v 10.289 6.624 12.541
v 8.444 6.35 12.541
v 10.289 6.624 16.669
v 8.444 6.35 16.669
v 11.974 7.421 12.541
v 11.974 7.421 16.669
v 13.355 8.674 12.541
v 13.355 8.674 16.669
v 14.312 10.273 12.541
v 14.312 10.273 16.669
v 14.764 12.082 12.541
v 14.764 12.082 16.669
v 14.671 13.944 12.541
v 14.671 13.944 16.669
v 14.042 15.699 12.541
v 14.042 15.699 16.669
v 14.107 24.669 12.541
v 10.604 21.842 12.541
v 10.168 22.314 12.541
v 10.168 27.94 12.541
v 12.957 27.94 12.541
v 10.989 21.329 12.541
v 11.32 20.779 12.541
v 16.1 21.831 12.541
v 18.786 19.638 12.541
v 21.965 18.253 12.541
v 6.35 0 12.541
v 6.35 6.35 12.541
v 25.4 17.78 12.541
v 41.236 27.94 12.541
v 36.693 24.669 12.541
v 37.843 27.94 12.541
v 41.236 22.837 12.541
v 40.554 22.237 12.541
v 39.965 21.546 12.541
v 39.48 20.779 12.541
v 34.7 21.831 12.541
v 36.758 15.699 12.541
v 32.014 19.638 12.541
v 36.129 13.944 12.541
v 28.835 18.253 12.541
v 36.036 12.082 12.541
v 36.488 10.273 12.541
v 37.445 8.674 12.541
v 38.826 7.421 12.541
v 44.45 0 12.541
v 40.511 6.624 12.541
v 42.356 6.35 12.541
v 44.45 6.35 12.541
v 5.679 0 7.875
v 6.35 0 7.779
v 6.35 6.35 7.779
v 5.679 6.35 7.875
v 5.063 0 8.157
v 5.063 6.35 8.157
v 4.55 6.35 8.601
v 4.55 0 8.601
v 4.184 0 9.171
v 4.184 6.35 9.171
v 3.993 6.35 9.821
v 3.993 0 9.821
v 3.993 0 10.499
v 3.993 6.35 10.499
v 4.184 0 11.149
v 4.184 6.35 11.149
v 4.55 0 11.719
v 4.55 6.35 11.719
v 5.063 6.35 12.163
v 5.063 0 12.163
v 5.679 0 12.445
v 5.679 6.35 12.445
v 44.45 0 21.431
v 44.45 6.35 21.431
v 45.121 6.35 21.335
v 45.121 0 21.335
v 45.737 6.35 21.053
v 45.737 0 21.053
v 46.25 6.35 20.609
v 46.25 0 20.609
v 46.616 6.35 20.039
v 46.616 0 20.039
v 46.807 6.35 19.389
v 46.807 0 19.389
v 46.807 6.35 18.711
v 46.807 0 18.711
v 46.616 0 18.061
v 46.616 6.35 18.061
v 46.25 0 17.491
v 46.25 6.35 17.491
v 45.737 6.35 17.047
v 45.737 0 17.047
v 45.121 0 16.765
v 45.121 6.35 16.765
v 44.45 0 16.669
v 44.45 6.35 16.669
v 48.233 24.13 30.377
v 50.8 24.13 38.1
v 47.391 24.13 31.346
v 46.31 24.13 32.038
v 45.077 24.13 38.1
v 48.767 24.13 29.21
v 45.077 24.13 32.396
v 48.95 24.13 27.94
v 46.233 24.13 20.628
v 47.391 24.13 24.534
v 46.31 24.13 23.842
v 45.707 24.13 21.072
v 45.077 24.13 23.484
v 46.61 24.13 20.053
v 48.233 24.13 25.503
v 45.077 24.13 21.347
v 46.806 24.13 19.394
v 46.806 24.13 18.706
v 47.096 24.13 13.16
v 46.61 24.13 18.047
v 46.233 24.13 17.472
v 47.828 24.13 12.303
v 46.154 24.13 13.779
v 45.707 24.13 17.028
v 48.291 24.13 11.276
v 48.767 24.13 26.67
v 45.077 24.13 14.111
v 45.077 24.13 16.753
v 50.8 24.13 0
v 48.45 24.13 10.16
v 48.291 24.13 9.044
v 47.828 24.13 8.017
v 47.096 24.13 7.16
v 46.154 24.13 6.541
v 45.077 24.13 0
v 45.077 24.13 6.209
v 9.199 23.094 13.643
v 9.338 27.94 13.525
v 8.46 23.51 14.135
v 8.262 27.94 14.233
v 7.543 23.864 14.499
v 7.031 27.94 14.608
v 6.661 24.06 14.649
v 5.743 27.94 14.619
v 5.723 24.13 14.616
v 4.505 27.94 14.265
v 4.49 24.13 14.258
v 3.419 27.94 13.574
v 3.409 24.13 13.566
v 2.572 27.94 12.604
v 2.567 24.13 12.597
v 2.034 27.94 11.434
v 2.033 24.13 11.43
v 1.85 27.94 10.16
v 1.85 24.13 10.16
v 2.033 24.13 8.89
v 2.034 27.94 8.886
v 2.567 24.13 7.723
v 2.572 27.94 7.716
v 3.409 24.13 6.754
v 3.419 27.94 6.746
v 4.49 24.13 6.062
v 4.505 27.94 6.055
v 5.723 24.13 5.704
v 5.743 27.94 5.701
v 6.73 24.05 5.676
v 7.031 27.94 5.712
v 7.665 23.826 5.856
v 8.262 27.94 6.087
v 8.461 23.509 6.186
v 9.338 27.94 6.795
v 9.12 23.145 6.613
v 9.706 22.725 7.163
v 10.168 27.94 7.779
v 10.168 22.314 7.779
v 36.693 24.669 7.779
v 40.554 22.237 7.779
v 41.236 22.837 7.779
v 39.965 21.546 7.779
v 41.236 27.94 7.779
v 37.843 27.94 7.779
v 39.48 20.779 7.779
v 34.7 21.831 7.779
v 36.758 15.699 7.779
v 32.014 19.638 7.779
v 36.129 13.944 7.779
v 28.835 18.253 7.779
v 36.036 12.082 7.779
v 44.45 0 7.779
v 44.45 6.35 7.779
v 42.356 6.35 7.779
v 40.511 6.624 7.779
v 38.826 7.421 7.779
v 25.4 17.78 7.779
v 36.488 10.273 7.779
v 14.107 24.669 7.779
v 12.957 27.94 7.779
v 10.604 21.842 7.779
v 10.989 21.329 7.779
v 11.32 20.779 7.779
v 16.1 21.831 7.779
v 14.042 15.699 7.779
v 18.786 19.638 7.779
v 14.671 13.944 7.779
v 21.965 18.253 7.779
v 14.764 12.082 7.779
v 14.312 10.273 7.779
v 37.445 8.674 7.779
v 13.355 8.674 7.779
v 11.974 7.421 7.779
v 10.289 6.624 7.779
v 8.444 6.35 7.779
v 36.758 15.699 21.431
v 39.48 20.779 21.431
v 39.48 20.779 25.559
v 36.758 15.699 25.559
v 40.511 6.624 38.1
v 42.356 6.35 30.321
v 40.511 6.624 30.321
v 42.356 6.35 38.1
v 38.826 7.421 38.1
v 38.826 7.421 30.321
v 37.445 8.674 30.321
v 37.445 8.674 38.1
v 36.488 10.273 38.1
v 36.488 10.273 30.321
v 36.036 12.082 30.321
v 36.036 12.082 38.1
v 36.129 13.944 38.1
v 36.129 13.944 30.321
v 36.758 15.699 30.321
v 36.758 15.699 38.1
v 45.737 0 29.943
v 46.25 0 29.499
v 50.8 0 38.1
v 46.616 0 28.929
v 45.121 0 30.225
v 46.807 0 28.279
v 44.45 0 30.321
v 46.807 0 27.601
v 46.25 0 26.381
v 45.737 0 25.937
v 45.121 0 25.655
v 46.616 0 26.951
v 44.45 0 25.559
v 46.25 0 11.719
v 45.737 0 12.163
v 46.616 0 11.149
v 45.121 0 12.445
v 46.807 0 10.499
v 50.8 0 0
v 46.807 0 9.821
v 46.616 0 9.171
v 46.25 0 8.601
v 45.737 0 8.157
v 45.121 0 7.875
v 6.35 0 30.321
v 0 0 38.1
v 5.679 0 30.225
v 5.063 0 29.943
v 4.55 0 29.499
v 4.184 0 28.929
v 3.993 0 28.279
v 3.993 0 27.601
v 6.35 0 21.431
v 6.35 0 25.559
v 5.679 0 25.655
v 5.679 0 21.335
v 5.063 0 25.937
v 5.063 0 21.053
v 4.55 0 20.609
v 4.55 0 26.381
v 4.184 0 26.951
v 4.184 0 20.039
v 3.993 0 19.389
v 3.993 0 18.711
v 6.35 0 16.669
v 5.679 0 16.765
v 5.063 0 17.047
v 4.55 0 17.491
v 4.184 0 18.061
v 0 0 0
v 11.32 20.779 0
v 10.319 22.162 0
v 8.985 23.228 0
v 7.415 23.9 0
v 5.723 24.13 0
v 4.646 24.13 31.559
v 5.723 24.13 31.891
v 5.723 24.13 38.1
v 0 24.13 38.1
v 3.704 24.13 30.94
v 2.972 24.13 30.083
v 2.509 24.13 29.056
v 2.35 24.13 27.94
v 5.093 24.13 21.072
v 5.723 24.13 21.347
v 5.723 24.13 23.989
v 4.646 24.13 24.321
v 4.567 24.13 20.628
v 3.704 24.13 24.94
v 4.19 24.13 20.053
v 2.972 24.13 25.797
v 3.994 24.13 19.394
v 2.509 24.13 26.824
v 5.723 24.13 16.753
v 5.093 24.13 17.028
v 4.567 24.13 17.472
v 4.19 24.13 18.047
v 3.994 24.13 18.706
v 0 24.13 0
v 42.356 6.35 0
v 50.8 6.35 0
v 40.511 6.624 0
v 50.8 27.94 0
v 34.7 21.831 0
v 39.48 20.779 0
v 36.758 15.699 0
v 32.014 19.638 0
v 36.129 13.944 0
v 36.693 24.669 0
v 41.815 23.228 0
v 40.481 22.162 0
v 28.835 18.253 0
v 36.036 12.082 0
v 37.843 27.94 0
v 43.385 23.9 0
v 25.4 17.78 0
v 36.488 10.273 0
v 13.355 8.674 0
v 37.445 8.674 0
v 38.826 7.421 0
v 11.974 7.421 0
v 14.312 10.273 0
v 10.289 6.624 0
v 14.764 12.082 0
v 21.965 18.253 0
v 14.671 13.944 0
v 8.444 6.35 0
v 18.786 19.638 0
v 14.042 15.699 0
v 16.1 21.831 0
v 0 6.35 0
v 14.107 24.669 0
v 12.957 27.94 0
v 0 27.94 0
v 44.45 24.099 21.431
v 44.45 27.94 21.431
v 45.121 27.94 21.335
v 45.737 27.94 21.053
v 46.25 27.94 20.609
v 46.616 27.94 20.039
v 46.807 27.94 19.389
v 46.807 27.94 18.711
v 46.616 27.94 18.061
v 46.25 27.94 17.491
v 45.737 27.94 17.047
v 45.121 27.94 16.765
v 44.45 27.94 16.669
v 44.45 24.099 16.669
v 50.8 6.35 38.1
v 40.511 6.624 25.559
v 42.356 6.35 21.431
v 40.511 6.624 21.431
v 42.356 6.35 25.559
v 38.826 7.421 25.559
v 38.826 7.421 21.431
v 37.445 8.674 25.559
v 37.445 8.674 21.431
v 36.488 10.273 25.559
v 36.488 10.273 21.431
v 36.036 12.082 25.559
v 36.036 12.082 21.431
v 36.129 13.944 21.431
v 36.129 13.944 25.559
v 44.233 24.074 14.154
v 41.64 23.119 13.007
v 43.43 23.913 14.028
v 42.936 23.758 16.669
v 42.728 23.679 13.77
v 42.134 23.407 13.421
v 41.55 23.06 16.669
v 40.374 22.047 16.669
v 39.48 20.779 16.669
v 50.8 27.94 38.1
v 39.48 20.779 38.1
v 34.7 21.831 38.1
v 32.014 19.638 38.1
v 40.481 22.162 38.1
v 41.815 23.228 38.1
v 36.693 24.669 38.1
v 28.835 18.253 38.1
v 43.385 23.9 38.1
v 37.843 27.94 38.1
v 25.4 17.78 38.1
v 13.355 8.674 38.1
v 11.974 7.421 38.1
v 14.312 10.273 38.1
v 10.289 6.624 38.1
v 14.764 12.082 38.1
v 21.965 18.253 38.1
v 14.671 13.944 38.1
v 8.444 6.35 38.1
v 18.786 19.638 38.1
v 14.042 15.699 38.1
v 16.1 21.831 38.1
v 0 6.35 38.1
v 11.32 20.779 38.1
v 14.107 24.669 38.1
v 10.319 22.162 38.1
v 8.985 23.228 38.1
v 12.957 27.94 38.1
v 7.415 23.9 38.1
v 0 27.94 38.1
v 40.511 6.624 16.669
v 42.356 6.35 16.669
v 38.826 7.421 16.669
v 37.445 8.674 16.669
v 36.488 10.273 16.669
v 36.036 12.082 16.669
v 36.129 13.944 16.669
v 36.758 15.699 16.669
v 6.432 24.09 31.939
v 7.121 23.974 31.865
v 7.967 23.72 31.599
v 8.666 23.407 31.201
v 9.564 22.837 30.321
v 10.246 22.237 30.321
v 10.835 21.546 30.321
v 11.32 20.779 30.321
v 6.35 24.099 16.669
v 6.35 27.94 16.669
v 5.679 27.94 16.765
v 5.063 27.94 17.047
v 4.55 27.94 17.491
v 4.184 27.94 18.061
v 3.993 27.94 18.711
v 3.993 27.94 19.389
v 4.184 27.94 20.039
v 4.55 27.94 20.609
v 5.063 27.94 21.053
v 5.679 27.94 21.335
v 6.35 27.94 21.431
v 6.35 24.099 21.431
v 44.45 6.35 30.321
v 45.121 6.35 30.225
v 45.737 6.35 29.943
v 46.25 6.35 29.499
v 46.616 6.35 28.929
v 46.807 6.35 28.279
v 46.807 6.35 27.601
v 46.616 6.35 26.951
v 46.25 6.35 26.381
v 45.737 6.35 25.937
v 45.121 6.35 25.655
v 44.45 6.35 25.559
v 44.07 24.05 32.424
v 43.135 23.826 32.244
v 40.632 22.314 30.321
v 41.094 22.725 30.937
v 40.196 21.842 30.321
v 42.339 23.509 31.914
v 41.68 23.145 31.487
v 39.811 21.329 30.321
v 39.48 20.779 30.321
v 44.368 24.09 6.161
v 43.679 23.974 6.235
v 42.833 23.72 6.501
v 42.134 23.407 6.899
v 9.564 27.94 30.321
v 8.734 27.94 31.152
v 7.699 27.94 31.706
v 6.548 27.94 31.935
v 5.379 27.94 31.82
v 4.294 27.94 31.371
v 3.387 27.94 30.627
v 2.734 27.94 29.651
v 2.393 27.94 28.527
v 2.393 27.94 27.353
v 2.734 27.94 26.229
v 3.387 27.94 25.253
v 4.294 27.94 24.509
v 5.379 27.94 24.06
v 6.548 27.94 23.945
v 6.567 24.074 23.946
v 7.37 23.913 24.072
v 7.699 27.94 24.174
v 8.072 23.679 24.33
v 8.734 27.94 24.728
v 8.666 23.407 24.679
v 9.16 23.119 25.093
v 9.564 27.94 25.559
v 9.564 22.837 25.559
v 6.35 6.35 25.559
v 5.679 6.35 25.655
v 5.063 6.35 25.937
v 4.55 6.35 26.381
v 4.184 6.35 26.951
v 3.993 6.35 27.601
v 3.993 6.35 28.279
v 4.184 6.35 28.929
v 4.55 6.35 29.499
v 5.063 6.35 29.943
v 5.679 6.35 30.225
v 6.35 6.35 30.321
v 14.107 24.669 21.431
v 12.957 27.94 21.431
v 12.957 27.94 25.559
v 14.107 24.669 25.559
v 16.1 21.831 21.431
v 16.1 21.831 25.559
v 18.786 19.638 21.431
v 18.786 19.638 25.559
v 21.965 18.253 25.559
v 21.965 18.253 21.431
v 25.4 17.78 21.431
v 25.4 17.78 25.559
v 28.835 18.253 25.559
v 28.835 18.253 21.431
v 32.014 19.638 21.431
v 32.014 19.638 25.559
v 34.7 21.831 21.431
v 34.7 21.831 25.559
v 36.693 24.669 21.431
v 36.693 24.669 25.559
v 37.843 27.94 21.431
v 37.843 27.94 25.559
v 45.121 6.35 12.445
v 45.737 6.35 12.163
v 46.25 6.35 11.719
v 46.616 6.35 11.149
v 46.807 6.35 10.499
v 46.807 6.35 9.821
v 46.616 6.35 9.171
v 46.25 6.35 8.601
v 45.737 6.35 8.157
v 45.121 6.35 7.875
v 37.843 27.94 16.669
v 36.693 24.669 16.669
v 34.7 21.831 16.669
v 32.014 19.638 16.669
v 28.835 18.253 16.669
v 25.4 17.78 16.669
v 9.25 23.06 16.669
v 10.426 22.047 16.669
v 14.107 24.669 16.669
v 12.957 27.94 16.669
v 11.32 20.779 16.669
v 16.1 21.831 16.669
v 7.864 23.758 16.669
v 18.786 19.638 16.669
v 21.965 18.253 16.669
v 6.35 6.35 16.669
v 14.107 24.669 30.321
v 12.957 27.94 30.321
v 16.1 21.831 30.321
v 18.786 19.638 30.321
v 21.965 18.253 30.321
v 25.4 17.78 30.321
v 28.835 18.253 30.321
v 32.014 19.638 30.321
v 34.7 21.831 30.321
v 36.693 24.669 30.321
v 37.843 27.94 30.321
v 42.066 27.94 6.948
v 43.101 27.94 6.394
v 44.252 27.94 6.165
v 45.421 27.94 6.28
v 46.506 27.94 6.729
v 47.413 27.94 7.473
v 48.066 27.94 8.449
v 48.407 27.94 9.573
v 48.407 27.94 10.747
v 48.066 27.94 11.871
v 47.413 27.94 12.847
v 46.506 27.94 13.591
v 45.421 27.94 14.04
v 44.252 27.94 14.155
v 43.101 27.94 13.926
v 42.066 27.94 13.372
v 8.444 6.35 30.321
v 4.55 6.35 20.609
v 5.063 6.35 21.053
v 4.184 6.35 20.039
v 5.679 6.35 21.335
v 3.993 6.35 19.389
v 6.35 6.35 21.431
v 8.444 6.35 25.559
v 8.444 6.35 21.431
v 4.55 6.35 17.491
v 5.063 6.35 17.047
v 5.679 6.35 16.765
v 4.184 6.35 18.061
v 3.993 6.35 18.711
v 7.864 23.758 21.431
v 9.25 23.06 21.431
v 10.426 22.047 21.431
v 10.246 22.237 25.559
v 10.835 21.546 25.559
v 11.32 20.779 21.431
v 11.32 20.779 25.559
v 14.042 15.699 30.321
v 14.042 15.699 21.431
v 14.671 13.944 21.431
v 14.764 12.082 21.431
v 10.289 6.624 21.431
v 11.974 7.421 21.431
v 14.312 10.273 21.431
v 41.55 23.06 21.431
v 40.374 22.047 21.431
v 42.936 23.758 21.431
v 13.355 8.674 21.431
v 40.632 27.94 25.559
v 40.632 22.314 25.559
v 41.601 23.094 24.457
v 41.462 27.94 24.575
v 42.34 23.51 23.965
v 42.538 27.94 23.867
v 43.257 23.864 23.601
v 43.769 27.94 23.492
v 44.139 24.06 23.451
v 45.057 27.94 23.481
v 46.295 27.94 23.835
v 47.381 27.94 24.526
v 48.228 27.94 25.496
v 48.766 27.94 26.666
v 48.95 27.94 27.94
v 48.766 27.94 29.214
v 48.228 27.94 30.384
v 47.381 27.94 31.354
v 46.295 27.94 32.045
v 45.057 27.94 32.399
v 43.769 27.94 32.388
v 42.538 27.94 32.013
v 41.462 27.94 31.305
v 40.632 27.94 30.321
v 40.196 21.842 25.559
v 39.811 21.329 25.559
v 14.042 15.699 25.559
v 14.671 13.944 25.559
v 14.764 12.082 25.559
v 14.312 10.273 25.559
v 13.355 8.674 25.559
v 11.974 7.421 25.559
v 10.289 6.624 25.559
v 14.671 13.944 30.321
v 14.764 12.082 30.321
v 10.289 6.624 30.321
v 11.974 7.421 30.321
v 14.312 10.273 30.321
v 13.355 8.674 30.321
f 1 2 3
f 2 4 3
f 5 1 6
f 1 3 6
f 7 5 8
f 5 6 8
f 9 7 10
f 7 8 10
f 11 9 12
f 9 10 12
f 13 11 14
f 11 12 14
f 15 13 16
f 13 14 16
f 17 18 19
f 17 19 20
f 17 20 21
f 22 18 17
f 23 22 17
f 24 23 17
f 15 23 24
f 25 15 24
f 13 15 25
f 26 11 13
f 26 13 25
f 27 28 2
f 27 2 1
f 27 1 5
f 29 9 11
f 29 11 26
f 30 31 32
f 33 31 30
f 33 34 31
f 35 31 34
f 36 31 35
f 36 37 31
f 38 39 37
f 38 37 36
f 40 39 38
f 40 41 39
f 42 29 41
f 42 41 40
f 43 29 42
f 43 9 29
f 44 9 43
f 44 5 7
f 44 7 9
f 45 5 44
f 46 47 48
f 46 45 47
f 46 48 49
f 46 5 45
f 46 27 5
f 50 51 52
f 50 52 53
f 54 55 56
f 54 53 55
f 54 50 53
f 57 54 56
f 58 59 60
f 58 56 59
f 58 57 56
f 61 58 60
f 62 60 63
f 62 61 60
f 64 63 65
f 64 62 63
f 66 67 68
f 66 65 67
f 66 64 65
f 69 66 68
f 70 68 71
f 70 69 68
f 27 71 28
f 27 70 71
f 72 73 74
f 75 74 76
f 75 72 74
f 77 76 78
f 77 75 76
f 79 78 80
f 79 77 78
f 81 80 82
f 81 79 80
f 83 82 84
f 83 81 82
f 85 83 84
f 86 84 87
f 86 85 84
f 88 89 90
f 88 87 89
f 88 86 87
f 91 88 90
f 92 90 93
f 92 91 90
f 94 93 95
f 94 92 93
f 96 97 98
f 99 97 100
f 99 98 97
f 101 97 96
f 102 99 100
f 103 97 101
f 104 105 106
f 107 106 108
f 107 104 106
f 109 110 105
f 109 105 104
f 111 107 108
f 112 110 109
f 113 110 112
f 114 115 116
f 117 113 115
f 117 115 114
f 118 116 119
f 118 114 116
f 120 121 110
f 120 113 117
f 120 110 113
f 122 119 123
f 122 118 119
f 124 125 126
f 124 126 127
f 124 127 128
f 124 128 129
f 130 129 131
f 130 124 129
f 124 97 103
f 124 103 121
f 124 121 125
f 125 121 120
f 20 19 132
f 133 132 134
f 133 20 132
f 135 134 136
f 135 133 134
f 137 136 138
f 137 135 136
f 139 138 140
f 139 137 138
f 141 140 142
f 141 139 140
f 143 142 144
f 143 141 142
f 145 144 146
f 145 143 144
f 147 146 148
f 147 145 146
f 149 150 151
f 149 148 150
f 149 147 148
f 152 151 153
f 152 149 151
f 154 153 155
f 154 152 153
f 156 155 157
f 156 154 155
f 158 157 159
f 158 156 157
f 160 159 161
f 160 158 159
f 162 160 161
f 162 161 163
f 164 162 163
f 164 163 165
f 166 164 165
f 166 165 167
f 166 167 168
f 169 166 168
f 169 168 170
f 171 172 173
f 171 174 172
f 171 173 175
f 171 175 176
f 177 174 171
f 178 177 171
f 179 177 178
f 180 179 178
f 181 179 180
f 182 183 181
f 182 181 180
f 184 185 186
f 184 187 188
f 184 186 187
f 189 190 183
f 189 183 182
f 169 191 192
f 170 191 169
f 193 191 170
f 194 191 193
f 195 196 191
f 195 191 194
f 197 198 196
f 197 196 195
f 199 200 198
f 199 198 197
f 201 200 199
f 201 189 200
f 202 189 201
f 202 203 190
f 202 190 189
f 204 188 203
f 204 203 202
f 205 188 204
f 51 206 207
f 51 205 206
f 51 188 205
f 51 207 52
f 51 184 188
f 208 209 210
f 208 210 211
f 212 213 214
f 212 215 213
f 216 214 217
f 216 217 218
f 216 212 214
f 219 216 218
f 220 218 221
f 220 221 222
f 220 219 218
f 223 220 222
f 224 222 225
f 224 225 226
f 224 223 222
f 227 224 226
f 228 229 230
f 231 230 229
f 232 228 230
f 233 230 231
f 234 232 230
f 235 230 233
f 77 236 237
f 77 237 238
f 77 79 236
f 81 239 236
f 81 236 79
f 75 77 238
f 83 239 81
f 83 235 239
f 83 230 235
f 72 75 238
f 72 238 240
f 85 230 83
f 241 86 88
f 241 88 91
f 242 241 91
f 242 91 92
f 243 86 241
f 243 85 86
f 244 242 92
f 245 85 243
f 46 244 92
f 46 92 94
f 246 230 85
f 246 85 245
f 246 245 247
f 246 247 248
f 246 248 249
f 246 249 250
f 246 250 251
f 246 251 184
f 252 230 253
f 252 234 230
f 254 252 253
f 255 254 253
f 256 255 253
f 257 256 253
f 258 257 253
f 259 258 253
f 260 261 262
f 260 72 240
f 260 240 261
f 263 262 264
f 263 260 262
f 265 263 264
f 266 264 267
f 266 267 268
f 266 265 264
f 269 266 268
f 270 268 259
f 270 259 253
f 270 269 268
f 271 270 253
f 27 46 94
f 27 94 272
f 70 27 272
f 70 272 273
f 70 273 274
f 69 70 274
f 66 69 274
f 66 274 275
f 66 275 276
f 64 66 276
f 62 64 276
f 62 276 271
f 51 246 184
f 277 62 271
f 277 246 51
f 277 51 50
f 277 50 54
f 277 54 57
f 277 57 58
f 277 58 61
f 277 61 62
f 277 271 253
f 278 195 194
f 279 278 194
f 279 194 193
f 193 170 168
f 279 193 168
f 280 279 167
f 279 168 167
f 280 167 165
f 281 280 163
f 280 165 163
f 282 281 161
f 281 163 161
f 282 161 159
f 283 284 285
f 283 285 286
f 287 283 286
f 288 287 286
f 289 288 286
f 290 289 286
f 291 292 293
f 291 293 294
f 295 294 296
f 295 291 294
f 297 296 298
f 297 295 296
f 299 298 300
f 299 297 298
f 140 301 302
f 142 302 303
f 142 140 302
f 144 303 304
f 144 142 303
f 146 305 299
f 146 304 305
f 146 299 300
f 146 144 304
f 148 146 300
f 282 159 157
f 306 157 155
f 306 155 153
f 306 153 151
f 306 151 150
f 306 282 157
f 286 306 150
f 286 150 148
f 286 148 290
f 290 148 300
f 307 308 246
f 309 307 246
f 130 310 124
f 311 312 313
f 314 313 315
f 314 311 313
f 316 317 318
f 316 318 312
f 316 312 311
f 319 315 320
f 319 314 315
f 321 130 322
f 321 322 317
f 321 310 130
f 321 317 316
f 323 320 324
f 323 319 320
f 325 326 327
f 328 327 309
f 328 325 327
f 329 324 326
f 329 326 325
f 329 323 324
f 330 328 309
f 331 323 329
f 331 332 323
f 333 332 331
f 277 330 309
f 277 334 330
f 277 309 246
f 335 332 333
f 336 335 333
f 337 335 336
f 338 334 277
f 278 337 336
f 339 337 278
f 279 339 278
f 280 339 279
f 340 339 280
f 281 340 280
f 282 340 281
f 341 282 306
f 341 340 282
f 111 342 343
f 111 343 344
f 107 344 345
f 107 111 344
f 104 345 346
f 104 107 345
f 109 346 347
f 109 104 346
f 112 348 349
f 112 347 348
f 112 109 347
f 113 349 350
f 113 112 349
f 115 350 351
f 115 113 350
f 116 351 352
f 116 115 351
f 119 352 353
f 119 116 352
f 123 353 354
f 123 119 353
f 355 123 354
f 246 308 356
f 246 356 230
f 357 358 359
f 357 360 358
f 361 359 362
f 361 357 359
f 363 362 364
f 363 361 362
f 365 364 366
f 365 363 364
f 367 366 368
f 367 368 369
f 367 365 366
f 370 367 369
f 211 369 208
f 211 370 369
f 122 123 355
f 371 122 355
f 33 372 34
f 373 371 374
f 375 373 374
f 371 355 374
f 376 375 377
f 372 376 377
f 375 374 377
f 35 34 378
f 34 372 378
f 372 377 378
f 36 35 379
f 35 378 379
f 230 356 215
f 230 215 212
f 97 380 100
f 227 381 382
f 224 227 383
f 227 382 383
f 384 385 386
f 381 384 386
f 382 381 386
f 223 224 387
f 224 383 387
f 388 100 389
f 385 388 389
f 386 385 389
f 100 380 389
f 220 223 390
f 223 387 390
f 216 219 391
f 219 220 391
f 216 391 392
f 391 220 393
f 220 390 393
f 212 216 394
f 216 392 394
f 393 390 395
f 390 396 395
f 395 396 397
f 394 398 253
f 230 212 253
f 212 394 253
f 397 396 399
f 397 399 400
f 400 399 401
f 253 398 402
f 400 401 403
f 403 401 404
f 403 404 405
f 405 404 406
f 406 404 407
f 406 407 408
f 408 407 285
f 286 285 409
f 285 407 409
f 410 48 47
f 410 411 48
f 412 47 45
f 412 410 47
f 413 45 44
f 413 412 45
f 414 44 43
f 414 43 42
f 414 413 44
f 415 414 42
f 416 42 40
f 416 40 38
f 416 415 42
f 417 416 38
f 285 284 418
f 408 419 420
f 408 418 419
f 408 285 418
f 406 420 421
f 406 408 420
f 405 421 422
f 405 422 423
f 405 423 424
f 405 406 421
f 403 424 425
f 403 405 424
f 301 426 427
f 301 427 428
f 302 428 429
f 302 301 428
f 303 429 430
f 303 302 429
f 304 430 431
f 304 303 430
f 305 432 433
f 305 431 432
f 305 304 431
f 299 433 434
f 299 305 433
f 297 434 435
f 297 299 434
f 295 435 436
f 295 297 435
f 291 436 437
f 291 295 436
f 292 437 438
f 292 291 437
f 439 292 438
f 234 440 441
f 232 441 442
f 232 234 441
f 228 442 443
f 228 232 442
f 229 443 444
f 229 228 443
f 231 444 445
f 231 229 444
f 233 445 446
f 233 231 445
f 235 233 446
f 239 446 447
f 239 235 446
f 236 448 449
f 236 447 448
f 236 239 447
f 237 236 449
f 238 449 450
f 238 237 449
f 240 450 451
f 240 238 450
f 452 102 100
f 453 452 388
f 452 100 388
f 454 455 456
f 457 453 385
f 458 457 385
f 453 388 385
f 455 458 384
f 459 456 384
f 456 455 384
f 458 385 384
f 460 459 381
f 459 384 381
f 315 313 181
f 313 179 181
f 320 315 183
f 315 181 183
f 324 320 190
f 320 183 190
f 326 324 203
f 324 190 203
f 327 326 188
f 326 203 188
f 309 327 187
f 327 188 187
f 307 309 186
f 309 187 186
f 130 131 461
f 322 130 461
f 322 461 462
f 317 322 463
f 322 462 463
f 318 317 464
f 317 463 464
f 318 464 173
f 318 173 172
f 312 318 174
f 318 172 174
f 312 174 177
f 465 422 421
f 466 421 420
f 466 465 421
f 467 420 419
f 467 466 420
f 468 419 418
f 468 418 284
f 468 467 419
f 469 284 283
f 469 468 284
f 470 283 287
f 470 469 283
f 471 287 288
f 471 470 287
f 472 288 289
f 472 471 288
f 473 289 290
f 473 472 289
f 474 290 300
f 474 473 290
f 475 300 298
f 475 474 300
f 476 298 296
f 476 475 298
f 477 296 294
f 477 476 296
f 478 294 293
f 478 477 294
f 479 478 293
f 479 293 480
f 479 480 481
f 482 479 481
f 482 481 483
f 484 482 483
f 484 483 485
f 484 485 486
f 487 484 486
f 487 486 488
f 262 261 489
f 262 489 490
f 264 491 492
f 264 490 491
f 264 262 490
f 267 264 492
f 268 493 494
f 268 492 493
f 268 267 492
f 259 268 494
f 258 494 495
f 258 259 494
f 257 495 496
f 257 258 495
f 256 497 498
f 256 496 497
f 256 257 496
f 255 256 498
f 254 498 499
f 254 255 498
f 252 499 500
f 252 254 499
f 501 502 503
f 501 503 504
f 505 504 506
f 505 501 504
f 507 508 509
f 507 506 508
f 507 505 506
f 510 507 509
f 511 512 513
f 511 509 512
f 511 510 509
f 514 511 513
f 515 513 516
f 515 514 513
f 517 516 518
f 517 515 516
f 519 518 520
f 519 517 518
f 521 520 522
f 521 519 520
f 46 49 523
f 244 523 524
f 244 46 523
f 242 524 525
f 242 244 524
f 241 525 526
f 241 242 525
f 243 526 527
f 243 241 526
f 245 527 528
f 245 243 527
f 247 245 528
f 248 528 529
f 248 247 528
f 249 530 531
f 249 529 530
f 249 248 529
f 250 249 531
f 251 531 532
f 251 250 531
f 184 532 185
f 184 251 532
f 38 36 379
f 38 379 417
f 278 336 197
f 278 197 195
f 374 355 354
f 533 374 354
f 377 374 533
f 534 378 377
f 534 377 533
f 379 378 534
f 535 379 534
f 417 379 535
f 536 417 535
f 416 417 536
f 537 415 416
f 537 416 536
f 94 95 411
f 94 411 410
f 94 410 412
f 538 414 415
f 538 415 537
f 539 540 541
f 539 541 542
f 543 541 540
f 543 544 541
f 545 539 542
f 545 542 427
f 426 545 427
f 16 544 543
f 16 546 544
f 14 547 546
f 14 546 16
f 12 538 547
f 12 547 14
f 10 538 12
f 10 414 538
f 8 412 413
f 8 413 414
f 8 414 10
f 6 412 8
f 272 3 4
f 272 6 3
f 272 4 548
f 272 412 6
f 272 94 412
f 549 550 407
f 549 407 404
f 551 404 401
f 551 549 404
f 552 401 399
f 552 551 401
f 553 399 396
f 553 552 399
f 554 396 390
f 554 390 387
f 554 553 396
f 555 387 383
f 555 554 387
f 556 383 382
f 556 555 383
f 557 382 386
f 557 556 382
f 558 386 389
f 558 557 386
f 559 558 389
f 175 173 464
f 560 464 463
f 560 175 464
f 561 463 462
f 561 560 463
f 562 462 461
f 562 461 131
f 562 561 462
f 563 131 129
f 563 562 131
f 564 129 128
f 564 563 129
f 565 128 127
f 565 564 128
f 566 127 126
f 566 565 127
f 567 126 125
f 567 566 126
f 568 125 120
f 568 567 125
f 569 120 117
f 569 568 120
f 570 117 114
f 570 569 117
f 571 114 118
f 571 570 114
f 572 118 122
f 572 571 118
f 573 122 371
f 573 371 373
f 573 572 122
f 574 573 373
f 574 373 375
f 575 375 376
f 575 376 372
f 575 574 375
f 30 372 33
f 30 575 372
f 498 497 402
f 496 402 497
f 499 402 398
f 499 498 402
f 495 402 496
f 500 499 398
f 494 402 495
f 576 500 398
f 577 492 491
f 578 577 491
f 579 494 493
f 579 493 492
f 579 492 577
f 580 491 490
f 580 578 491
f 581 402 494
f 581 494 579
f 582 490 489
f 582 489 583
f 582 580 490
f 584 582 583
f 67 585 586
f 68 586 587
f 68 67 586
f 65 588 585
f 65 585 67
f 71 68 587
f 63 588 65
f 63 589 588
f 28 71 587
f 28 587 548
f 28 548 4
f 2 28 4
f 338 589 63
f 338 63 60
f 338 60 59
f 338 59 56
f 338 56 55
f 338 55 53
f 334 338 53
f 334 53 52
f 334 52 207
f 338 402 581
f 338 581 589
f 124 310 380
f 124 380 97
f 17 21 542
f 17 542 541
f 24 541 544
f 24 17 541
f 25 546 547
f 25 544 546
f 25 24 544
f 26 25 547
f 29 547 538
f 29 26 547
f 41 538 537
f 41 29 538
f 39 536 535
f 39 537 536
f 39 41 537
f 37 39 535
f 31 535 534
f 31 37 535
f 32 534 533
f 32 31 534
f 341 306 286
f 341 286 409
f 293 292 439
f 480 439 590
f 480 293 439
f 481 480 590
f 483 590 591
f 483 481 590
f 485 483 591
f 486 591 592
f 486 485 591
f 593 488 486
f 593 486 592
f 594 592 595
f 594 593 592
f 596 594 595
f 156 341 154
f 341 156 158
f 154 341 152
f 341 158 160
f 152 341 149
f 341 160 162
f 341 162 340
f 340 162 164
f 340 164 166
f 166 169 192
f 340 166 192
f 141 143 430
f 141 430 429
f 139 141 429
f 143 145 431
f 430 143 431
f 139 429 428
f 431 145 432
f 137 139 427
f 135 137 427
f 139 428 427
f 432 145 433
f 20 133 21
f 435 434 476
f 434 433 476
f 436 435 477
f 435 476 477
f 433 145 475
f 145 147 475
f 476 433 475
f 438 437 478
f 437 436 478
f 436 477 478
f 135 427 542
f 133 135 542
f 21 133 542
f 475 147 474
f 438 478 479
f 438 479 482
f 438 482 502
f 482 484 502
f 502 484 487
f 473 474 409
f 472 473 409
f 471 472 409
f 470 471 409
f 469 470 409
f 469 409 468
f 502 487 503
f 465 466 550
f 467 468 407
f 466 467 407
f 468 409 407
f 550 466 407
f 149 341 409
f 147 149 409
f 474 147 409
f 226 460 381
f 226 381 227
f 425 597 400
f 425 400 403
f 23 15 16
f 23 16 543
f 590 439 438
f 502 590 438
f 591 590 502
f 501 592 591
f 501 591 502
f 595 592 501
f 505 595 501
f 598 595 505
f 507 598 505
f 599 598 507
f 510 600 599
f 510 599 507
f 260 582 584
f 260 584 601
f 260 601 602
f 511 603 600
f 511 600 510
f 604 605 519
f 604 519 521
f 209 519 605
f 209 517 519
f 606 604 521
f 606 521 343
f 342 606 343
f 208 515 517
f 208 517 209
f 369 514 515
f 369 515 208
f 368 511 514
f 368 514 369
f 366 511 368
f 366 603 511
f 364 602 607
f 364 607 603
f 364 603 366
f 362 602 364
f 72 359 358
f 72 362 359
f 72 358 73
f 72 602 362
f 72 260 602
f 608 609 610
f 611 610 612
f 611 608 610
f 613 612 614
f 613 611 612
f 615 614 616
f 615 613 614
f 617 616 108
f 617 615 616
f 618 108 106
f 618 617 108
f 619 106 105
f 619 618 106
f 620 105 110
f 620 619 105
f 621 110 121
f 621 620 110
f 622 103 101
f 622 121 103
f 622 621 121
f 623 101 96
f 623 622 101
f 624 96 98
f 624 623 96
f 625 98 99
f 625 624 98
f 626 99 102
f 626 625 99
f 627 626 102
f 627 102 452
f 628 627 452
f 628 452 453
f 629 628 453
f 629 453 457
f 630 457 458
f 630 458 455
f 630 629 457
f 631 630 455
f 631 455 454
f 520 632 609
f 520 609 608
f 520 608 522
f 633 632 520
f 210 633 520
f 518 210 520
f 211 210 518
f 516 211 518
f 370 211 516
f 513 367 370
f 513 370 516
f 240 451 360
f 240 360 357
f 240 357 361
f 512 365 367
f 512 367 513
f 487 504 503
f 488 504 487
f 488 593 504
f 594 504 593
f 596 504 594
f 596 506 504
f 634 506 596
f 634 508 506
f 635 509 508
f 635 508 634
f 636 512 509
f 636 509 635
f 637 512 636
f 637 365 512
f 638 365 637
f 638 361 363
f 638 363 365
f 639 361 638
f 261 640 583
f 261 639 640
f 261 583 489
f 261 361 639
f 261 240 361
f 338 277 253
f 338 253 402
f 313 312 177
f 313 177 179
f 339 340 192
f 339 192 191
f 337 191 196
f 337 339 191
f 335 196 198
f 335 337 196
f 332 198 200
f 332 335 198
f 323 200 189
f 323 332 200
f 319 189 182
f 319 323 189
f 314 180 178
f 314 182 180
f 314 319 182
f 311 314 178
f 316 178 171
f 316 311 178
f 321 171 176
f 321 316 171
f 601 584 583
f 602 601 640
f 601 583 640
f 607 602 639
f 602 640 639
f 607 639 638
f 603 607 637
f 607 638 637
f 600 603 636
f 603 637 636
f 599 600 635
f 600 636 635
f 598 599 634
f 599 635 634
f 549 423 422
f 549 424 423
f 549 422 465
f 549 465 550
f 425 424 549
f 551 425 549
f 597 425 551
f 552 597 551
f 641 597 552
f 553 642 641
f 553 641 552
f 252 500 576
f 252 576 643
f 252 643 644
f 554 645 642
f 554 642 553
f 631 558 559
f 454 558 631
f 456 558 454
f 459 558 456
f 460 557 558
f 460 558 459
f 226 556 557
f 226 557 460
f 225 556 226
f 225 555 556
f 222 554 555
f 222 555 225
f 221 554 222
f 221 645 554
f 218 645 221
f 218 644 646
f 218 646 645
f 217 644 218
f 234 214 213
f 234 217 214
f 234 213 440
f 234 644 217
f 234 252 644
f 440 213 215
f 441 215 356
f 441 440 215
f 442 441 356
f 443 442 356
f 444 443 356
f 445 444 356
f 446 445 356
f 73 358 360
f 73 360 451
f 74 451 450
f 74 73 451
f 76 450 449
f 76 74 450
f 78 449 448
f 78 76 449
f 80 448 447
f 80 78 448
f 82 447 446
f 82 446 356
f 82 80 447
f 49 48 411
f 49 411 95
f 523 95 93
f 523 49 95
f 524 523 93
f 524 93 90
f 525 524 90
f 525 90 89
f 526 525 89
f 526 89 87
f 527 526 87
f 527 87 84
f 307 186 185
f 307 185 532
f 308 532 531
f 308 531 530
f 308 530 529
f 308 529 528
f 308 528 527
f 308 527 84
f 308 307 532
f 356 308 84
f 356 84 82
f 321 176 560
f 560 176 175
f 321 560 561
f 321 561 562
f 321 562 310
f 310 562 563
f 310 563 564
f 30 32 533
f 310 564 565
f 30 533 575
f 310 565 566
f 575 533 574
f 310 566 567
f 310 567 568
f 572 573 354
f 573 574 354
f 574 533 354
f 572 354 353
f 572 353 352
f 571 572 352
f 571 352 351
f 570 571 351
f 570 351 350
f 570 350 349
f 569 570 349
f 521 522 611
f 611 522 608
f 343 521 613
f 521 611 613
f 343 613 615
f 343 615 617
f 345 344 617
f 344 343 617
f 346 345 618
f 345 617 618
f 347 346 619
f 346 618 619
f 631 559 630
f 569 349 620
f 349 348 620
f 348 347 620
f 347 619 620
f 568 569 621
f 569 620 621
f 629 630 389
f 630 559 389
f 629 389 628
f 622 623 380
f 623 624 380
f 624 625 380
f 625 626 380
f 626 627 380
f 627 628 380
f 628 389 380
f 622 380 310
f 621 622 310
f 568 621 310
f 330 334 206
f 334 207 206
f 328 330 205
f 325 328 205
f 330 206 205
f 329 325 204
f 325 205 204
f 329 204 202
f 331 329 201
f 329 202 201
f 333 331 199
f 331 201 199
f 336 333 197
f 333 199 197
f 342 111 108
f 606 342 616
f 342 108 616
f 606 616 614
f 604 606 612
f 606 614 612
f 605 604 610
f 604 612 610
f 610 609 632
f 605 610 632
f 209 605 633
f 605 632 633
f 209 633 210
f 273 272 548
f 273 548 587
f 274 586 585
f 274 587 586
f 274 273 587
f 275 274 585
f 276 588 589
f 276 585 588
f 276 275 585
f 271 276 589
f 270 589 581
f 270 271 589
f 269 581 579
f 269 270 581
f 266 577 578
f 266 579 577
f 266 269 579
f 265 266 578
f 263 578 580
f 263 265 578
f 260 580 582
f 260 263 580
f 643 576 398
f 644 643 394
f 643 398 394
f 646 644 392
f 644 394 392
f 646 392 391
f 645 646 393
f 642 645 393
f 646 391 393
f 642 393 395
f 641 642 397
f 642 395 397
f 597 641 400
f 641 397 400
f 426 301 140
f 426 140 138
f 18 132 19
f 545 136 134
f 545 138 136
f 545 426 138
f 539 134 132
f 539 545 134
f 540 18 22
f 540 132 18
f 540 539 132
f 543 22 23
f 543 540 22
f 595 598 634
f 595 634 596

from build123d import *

# Parameters (mm, degrees)
BOSS_EXTRUDE1_DEPTH     = 38.1
CUT_EXTRUDE2_DEPTH      = 71.436357089
FILLET1_R               = 6.35
SKETCH4_W               = 50.8
SKETCH4_H               = 2.54
CUT_EXTRUDE3_DEPTH      = 71.436357187
CUT_EXTRUDE5_DEPTH      = 5.08
CUT_EXTRUDE5_DEPTH_BACK = 25.4
SKETCH5_R               = 4.5
SKETCH5_R_2             = 4


with BuildPart() as part:
    # Sketch1 → Boss-Extrude1 (new body)
    with BuildSketch(Plane.XY):
        with BuildLine():
            Line((38.1, 30.48), (50.8, 30.48))
            Line((50.8, 30.48), (50.8, 24.13))
            Line((50.8, 24.13), (41.275, 24.13))
            Line((41.275, 24.13), (31.75, 6.35))
            Line((31.75, 6.35), (50.8, 6.35))
            Line((50.8, 6.35), (50.8, 0))
            Line((50.8, 0), (0, 0))
            Line((0, 0), (0, 6.35))
            Line((0, 6.35), (19.05, 6.35))
            Line((19.05, 6.35), (9.525, 24.13))
            Line((9.525, 24.13), (0, 24.13))
            Line((0, 24.13), (0, 30.48))
            Line((0, 30.48), (12.7, 30.48))
            ThreePointArc((12.7, 30.48), (25.4, 17.78), (38.1, 30.48))
        make_face()
    extrude(amount=BOSS_EXTRUDE1_DEPTH)

    # Sketch3 → Cut-Extrude2 (cut, through all)
    with BuildSketch(Plane.XZ):
        with BuildLine():
            Line((6.35, 21.43125), (44.45, 21.43125))
            ThreePointArc((44.45, 21.43125), (46.83125, 19.05), (44.45, 16.66875))
            Line((44.45, 16.66875), (6.35, 16.66875))
            ThreePointArc((6.35, 16.66875), (3.96875, 19.05), (6.35, 21.43125))
        make_face()
        with BuildLine():
            Line((6.35, 30.32125), (44.45, 30.32125))
            ThreePointArc((44.45, 30.32125), (46.83125, 27.94), (44.45, 25.55875))
            Line((44.45, 25.55875), (6.35, 25.55875))
            ThreePointArc((6.35, 25.55875), (3.96875, 27.94), (6.35, 30.32125))
        make_face()
        with BuildLine():
            Line((6.35, 12.54125), (44.45, 12.54125))
            ThreePointArc((44.45, 12.54125), (46.83125, 10.16), (44.45, 7.77875))
            Line((44.45, 7.77875), (6.35, 7.77875))
            ThreePointArc((6.35, 7.77875), (3.96875, 10.16), (6.35, 12.54125))
        make_face()
    extrude(amount=-CUT_EXTRUDE2_DEPTH, mode=Mode.SUBTRACT)

    # Fillet1
    fillet1_edges = [part.edges().sort_by_distance(p)[0] for p in [
        (41.275, 24.13, 3.889375),
        (41.275, 24.13, 34.210625),
        (19.05, 6.35, 34.210625),
        (19.05, 6.35, 23.495),
        (19.05, 6.35, 14.605),
        (19.05, 6.35, 3.889375),
        (31.75, 6.35, 34.210625),
        (31.75, 6.35, 23.495),
        (31.75, 6.35, 14.605),
        (31.75, 6.35, 3.889375),
        (9.525, 24.13, 34.210625),
        (9.525, 24.13, 23.495),
        (9.525, 24.13, 14.605),
        (9.525, 24.13, 3.889375),
        (41.275, 24.13, 23.495),
        (41.275, 24.13, 14.605),
    ]]
    fillet(fillet1_edges, radius=FILLET1_R)

    # Sketch4 → Cut-Extrude3 (cut, through all)
    with BuildSketch(Plane.XY.offset(38.1)):
        with Locations((25.4, 29.21)):
            Rectangle(SKETCH4_W, SKETCH4_H)
    extrude(amount=-CUT_EXTRUDE3_DEPTH, mode=Mode.SUBTRACT)

    # Sketch5 → Cut-Extrude5 (cut, two sides: drawn at the far end of the back side and taken through both)
    with BuildSketch(Plane.XZ.offset(-24.13).offset(-CUT_EXTRUDE5_DEPTH_BACK)):
        with Locations((44.45, 27.94)):
            Circle(SKETCH5_R)
        with Locations((6.35, 27.94)):
            Circle(SKETCH5_R_2)
        with Locations((6.35, 10.16)):
            Circle(SKETCH5_R)
        with Locations((44.45, 10.16)):
            Circle(SKETCH5_R_2)
    extrude(amount=CUT_EXTRUDE5_DEPTH + CUT_EXTRUDE5_DEPTH_BACK, mode=Mode.SUBTRACT)


solid = part.part
